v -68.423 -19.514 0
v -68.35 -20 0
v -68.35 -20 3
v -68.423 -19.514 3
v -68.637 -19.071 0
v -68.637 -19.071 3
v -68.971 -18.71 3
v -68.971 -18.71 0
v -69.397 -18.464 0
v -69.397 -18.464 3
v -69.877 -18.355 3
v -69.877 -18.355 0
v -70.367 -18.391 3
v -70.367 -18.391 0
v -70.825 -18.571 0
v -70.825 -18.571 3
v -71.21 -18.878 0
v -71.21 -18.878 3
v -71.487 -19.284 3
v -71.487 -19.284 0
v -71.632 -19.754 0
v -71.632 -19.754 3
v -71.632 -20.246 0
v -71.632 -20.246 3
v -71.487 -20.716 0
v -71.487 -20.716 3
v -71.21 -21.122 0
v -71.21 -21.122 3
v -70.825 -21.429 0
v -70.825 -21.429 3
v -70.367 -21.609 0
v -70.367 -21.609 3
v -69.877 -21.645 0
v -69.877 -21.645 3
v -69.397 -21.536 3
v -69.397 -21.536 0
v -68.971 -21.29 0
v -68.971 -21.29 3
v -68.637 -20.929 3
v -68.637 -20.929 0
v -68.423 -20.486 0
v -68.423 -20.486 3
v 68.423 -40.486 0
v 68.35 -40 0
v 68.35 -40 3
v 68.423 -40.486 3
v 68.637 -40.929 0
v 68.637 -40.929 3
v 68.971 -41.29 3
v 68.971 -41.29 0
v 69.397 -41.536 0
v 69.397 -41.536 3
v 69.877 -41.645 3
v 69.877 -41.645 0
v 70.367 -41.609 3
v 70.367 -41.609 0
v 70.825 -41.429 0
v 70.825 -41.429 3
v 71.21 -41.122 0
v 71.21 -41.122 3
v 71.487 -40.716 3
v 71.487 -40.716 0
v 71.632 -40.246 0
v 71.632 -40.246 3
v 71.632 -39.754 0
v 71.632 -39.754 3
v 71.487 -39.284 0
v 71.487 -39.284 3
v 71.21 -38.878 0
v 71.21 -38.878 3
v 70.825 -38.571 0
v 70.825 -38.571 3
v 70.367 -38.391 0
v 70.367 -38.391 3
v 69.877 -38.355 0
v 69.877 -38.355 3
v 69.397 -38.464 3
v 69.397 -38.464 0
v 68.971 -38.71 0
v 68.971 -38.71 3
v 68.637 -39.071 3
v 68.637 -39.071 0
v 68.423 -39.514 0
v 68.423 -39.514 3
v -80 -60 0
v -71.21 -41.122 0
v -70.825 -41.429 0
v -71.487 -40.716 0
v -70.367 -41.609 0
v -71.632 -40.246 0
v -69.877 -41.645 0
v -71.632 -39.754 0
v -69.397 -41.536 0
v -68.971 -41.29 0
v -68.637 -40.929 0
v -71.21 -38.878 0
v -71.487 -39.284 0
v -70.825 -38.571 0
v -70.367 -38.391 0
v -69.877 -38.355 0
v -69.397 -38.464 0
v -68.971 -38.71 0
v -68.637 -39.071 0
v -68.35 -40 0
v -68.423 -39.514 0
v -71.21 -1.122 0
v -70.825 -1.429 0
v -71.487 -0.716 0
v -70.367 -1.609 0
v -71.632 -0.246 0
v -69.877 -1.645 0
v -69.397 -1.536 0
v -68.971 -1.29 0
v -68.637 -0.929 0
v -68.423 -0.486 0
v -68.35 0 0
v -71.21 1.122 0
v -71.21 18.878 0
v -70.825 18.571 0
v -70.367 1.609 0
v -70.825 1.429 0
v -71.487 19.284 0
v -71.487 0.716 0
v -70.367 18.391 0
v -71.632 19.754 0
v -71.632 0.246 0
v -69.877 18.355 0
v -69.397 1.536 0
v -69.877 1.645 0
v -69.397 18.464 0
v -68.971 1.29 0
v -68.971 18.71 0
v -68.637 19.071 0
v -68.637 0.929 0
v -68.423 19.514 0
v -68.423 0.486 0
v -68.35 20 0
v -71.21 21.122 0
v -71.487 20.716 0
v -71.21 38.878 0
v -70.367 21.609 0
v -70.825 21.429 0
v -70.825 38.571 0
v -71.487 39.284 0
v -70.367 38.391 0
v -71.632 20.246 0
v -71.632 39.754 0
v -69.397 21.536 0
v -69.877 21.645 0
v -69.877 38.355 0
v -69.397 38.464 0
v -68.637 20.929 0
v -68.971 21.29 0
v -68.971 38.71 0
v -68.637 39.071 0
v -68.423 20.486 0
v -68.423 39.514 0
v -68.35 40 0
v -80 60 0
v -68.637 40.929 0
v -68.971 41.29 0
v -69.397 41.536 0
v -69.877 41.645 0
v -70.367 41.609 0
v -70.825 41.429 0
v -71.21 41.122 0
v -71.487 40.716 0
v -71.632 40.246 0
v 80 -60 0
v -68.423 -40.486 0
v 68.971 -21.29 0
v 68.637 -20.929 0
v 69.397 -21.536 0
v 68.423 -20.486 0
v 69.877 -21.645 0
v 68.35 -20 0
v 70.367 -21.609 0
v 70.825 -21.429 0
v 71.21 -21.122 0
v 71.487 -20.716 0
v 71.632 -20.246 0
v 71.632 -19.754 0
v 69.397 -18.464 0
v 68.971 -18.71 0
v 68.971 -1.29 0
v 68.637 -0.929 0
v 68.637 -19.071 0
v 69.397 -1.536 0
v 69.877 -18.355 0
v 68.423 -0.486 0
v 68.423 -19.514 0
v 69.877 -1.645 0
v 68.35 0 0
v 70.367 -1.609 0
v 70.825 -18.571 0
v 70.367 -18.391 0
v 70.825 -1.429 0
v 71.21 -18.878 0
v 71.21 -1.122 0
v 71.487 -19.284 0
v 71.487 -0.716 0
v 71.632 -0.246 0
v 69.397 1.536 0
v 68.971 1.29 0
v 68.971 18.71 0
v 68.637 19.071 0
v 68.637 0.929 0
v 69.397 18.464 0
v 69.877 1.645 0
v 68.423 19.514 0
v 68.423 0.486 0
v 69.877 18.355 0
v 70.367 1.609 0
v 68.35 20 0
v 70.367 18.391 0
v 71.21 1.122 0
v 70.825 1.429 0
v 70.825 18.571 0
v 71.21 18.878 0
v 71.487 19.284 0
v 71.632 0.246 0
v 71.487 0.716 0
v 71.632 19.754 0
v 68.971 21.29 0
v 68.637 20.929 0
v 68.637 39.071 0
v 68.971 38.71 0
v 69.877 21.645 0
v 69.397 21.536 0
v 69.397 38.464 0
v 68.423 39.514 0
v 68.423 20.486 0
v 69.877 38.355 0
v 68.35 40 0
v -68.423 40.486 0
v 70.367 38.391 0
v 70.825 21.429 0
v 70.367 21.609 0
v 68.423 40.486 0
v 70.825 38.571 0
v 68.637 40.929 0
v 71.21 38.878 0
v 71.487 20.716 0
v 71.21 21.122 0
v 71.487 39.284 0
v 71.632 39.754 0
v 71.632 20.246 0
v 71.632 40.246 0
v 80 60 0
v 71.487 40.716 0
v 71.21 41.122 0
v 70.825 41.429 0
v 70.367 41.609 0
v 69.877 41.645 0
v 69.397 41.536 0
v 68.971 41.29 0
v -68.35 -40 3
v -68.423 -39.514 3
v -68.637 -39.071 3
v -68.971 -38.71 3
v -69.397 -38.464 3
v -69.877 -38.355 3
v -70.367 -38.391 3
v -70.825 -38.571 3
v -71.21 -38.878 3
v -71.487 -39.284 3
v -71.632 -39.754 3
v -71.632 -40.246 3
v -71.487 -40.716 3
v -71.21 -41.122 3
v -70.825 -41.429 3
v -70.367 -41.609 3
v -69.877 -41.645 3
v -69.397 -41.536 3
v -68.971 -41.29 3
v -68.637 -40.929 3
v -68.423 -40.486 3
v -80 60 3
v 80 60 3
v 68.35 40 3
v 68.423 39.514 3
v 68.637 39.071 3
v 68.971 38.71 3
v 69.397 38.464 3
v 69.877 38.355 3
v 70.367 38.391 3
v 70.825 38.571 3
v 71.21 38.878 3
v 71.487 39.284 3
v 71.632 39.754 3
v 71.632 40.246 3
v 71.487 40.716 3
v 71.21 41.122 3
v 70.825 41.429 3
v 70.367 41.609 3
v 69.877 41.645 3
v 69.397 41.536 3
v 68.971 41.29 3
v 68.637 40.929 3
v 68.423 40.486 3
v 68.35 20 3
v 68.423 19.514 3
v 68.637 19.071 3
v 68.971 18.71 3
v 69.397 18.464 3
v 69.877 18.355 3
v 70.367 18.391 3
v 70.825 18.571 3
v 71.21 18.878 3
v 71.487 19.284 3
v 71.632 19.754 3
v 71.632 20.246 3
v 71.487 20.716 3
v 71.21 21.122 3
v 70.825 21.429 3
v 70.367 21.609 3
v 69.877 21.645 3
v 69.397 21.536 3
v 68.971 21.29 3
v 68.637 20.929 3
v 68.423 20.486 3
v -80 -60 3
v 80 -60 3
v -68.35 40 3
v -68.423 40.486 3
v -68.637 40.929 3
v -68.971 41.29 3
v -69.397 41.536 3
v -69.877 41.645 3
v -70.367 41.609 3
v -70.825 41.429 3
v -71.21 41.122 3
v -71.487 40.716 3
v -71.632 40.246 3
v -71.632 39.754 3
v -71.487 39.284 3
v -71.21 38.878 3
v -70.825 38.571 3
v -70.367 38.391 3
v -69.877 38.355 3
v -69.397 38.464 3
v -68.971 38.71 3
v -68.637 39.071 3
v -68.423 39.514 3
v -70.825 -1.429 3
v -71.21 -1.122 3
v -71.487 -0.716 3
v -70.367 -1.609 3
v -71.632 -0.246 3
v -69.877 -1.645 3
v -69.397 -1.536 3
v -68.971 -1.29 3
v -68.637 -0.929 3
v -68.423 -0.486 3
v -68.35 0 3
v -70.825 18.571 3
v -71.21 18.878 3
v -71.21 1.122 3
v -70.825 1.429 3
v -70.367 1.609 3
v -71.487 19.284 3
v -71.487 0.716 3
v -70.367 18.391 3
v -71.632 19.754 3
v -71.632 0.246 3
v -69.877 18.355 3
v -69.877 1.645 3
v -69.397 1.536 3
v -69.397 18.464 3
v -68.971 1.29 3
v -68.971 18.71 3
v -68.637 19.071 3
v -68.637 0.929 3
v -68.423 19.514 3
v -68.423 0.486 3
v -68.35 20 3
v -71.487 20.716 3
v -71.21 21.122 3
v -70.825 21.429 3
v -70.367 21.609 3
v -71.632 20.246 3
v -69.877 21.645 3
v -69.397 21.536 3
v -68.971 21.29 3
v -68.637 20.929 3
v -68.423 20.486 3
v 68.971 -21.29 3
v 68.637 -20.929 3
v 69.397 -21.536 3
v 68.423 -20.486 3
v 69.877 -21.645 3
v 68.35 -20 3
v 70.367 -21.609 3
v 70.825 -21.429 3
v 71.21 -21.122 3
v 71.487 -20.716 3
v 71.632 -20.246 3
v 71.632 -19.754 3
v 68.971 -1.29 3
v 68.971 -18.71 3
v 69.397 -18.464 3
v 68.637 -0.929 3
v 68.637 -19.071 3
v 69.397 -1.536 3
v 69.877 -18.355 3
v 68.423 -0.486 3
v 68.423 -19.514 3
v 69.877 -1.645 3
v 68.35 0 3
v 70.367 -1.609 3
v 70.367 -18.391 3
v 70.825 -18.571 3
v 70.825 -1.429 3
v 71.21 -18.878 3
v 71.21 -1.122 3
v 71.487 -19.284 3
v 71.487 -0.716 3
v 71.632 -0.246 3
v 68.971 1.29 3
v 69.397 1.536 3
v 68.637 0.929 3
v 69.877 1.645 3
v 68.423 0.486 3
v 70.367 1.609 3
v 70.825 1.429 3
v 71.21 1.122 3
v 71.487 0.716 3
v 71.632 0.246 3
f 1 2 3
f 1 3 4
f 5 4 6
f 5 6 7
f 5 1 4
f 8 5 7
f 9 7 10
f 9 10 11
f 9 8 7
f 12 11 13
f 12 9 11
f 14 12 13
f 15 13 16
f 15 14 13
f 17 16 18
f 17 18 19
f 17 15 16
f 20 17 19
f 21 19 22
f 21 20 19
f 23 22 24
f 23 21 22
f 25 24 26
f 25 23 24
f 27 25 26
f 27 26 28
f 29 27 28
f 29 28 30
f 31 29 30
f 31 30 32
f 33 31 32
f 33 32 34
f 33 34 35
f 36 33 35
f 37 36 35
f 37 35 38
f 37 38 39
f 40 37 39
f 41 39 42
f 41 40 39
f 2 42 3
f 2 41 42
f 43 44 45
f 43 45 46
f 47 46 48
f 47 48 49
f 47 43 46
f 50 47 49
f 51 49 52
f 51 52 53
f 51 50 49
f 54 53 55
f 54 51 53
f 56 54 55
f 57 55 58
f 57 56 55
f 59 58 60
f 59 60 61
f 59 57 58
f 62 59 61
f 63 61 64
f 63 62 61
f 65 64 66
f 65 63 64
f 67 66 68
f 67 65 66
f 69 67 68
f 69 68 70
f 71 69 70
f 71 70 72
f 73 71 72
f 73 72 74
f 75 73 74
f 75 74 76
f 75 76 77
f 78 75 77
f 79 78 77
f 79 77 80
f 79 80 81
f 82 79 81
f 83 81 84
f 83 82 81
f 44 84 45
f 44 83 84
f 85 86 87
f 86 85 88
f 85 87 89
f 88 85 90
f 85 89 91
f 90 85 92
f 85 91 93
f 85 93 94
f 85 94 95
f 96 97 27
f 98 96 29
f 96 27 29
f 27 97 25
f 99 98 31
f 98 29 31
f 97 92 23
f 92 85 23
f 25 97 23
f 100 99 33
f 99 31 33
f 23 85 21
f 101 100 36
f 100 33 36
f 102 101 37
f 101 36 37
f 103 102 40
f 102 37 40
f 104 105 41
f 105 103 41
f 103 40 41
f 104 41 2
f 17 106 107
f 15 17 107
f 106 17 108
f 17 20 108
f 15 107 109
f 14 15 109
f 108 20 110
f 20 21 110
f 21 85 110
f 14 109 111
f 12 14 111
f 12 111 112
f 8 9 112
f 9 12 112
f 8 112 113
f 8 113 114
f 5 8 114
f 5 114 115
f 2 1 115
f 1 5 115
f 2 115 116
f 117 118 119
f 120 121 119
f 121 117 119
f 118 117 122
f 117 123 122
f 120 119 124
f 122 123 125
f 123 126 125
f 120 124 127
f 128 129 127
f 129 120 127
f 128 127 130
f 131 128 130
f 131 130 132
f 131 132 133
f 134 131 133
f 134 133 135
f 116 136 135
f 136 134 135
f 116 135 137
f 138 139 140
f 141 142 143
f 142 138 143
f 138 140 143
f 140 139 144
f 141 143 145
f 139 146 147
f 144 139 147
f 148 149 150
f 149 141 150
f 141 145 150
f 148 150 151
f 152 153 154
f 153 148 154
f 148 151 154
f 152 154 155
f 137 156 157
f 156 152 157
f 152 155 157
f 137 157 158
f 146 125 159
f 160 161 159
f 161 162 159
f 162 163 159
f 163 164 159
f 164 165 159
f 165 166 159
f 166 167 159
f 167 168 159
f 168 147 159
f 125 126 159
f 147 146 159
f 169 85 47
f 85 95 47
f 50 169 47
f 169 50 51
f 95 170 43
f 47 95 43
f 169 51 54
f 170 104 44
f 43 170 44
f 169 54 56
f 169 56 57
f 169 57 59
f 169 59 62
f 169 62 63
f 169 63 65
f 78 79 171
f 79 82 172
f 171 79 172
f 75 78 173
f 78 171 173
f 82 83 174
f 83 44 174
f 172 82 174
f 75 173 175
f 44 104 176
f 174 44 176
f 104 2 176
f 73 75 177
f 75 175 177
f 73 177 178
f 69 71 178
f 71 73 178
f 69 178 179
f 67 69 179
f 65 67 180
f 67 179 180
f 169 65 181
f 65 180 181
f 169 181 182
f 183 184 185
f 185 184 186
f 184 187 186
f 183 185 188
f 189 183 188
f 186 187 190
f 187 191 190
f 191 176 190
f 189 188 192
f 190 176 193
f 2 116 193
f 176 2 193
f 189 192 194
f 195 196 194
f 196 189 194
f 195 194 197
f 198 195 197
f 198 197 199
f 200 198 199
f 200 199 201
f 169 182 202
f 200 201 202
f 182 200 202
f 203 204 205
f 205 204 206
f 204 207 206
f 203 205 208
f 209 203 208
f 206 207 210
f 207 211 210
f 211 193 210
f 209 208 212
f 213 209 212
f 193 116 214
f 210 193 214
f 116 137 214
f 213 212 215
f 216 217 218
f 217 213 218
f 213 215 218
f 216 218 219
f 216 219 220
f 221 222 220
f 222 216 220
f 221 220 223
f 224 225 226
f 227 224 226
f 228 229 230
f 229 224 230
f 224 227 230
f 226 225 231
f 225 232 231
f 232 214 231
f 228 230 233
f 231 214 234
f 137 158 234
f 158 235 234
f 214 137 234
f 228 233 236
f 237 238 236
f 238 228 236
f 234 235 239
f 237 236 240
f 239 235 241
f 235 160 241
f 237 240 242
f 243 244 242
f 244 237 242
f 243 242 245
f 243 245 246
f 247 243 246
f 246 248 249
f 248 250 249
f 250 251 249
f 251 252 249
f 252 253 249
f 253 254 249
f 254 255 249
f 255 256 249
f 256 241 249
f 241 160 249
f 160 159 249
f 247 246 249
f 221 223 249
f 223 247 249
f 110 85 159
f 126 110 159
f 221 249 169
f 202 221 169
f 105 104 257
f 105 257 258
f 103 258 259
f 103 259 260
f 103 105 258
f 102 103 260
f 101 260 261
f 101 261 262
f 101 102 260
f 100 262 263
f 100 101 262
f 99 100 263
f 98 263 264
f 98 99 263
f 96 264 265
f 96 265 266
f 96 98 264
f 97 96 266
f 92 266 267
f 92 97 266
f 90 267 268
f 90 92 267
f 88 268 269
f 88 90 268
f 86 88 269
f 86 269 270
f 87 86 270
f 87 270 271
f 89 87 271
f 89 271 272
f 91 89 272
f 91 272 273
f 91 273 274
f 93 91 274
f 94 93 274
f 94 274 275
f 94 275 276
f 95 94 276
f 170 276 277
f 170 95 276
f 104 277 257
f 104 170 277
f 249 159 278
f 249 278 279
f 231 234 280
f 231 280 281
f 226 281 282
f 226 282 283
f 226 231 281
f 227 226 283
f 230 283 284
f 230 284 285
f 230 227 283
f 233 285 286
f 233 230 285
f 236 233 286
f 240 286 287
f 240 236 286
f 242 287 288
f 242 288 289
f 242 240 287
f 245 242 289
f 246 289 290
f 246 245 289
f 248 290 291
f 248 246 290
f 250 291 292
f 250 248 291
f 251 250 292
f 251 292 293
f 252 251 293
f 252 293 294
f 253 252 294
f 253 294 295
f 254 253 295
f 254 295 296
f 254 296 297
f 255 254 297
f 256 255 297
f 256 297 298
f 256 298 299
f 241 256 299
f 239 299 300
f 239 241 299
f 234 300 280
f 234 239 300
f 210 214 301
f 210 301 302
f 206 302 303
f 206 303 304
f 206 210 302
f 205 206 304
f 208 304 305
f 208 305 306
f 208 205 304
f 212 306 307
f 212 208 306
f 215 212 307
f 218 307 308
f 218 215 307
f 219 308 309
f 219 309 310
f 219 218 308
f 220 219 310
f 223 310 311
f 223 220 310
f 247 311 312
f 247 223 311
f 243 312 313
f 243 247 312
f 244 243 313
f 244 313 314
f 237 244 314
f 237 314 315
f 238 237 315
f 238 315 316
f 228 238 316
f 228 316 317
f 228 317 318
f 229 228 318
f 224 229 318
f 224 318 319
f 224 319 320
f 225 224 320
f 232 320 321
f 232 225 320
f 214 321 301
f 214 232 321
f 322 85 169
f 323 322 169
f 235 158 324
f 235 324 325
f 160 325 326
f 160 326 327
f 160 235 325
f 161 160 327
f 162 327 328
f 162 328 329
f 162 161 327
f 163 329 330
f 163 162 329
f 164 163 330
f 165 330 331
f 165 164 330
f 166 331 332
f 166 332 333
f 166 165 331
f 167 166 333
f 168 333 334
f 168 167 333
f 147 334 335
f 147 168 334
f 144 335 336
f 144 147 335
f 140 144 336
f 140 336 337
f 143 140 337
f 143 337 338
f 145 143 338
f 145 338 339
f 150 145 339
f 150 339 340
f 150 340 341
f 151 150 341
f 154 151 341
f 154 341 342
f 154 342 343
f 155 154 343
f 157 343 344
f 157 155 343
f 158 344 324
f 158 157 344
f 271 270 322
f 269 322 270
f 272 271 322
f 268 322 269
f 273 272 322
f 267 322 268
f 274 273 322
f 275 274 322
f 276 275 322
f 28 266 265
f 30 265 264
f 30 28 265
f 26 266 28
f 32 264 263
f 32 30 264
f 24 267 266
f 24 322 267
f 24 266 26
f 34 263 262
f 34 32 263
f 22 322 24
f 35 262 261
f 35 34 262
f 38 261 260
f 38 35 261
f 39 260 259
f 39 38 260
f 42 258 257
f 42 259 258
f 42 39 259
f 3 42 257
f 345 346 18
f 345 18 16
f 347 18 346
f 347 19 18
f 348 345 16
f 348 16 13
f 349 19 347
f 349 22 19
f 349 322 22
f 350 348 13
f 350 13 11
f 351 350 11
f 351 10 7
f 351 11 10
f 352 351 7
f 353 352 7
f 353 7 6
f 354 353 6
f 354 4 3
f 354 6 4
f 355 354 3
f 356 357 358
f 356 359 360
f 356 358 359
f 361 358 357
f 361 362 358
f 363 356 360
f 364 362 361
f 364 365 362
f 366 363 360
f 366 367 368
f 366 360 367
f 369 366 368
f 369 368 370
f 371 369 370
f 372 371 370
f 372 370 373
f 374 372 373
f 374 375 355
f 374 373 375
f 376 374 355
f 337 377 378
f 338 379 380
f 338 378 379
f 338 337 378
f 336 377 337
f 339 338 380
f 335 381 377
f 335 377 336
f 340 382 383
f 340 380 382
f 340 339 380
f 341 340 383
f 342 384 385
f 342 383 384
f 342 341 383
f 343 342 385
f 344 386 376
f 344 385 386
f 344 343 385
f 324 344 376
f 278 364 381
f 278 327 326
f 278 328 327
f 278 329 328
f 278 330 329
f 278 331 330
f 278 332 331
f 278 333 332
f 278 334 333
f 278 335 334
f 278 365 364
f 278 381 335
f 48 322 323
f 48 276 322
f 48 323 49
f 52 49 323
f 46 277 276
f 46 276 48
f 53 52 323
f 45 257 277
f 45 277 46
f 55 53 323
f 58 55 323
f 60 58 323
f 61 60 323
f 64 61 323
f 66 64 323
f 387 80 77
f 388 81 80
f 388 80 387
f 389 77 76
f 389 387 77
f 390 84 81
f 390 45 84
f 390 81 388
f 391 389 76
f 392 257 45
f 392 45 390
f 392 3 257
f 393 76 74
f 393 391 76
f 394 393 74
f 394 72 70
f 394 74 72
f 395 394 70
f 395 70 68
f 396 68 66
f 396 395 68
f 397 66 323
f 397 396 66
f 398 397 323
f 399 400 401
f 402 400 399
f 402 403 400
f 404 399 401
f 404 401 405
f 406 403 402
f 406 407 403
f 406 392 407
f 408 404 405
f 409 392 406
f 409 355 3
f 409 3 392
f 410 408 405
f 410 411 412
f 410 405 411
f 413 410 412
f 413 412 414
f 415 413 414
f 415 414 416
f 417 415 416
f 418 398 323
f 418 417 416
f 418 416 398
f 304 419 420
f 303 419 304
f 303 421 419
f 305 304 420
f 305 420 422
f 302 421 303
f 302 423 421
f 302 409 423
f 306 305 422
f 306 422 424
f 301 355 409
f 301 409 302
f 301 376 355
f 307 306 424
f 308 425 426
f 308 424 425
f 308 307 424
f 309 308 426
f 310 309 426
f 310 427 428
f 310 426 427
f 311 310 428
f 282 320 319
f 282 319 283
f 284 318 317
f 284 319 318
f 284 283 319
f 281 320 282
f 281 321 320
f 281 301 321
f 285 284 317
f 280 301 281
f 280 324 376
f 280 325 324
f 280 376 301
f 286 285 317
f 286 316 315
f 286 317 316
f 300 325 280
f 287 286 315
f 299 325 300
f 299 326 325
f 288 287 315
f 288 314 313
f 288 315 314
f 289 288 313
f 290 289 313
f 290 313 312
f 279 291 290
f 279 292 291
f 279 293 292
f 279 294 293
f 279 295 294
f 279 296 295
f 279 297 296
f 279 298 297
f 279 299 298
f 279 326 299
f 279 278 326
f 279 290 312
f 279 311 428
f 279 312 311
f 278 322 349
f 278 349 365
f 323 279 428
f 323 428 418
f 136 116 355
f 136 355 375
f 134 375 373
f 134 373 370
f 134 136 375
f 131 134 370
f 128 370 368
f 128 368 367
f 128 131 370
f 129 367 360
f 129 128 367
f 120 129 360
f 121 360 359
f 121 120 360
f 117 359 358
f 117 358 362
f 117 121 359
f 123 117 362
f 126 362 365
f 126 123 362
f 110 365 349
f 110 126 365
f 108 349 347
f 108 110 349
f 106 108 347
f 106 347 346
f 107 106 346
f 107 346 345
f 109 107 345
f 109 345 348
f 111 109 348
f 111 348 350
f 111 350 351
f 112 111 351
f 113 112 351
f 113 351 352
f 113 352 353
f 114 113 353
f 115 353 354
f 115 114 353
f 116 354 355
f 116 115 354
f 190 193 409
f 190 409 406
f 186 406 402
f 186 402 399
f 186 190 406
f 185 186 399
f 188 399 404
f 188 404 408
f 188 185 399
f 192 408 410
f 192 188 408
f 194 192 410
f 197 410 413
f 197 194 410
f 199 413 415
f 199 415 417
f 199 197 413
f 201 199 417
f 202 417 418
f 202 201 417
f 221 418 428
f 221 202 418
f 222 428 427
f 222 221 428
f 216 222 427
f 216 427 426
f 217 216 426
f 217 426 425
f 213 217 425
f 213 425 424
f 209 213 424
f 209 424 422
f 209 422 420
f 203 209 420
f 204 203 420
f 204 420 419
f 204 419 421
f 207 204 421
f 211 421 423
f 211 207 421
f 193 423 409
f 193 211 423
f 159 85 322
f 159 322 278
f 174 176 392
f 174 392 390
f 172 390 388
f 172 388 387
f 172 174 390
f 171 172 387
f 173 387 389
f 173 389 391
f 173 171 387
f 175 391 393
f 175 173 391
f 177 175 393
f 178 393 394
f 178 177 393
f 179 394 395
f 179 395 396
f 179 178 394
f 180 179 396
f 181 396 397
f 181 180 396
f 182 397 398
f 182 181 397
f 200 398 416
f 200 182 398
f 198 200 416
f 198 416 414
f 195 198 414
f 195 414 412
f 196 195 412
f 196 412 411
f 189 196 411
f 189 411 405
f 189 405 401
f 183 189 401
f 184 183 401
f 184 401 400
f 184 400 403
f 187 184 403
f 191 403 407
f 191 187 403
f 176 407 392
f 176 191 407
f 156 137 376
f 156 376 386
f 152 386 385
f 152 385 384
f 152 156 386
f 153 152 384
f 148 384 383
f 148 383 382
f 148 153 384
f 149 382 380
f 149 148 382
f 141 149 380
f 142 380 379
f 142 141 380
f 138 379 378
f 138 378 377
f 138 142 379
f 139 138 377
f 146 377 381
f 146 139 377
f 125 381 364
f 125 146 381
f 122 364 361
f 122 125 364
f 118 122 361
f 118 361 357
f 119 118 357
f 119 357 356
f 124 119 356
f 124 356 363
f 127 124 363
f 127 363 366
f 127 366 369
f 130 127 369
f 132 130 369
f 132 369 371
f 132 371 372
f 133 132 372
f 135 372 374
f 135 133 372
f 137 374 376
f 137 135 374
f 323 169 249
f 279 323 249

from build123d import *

# Parameters (mm, degrees)
SKETCH_1_W      = 160
SKETCH_1_H      = 120
SKETCH_1_R      = 1.65
EXTRUDE_1_DEPTH = 3


with BuildPart() as part:
    # 草图1 → 凸台-拉伸1 (new body)
    with BuildSketch(Plane.XY):
        Rectangle(SKETCH_1_W, SKETCH_1_H)
        with Locations((-70, 40)):
            Circle(SKETCH_1_R, mode=Mode.SUBTRACT)
        with Locations((-70, 20)):
            Circle(SKETCH_1_R, mode=Mode.SUBTRACT)
        with Locations((-70, 0)):
            Circle(SKETCH_1_R, mode=Mode.SUBTRACT)
        with Locations((-70, -20)):
            Circle(SKETCH_1_R, mode=Mode.SUBTRACT)
        with Locations((-70, -40)):
            Circle(SKETCH_1_R, mode=Mode.SUBTRACT)
        with Locations(Location((70, -40, 0), (0, 0, 180))):
            Circle(SKETCH_1_R, mode=Mode.SUBTRACT)
        with Locations(Location((70, -20, 0), (0, 0, 180))):
            Circle(SKETCH_1_R, mode=Mode.SUBTRACT)
        with Locations(Location((70, 0, 0), (0, 0, 180))):
            Circle(SKETCH_1_R, mode=Mode.SUBTRACT)
        with Locations(Location((70, 20, 0), (0, 0, 180))):
            Circle(SKETCH_1_R, mode=Mode.SUBTRACT)
        with Locations(Location((70, 40, 0), (0, 0, 180))):
            Circle(SKETCH_1_R, mode=Mode.SUBTRACT)
    extrude(amount=EXTRUDE_1_DEPTH)


solid = part.part
